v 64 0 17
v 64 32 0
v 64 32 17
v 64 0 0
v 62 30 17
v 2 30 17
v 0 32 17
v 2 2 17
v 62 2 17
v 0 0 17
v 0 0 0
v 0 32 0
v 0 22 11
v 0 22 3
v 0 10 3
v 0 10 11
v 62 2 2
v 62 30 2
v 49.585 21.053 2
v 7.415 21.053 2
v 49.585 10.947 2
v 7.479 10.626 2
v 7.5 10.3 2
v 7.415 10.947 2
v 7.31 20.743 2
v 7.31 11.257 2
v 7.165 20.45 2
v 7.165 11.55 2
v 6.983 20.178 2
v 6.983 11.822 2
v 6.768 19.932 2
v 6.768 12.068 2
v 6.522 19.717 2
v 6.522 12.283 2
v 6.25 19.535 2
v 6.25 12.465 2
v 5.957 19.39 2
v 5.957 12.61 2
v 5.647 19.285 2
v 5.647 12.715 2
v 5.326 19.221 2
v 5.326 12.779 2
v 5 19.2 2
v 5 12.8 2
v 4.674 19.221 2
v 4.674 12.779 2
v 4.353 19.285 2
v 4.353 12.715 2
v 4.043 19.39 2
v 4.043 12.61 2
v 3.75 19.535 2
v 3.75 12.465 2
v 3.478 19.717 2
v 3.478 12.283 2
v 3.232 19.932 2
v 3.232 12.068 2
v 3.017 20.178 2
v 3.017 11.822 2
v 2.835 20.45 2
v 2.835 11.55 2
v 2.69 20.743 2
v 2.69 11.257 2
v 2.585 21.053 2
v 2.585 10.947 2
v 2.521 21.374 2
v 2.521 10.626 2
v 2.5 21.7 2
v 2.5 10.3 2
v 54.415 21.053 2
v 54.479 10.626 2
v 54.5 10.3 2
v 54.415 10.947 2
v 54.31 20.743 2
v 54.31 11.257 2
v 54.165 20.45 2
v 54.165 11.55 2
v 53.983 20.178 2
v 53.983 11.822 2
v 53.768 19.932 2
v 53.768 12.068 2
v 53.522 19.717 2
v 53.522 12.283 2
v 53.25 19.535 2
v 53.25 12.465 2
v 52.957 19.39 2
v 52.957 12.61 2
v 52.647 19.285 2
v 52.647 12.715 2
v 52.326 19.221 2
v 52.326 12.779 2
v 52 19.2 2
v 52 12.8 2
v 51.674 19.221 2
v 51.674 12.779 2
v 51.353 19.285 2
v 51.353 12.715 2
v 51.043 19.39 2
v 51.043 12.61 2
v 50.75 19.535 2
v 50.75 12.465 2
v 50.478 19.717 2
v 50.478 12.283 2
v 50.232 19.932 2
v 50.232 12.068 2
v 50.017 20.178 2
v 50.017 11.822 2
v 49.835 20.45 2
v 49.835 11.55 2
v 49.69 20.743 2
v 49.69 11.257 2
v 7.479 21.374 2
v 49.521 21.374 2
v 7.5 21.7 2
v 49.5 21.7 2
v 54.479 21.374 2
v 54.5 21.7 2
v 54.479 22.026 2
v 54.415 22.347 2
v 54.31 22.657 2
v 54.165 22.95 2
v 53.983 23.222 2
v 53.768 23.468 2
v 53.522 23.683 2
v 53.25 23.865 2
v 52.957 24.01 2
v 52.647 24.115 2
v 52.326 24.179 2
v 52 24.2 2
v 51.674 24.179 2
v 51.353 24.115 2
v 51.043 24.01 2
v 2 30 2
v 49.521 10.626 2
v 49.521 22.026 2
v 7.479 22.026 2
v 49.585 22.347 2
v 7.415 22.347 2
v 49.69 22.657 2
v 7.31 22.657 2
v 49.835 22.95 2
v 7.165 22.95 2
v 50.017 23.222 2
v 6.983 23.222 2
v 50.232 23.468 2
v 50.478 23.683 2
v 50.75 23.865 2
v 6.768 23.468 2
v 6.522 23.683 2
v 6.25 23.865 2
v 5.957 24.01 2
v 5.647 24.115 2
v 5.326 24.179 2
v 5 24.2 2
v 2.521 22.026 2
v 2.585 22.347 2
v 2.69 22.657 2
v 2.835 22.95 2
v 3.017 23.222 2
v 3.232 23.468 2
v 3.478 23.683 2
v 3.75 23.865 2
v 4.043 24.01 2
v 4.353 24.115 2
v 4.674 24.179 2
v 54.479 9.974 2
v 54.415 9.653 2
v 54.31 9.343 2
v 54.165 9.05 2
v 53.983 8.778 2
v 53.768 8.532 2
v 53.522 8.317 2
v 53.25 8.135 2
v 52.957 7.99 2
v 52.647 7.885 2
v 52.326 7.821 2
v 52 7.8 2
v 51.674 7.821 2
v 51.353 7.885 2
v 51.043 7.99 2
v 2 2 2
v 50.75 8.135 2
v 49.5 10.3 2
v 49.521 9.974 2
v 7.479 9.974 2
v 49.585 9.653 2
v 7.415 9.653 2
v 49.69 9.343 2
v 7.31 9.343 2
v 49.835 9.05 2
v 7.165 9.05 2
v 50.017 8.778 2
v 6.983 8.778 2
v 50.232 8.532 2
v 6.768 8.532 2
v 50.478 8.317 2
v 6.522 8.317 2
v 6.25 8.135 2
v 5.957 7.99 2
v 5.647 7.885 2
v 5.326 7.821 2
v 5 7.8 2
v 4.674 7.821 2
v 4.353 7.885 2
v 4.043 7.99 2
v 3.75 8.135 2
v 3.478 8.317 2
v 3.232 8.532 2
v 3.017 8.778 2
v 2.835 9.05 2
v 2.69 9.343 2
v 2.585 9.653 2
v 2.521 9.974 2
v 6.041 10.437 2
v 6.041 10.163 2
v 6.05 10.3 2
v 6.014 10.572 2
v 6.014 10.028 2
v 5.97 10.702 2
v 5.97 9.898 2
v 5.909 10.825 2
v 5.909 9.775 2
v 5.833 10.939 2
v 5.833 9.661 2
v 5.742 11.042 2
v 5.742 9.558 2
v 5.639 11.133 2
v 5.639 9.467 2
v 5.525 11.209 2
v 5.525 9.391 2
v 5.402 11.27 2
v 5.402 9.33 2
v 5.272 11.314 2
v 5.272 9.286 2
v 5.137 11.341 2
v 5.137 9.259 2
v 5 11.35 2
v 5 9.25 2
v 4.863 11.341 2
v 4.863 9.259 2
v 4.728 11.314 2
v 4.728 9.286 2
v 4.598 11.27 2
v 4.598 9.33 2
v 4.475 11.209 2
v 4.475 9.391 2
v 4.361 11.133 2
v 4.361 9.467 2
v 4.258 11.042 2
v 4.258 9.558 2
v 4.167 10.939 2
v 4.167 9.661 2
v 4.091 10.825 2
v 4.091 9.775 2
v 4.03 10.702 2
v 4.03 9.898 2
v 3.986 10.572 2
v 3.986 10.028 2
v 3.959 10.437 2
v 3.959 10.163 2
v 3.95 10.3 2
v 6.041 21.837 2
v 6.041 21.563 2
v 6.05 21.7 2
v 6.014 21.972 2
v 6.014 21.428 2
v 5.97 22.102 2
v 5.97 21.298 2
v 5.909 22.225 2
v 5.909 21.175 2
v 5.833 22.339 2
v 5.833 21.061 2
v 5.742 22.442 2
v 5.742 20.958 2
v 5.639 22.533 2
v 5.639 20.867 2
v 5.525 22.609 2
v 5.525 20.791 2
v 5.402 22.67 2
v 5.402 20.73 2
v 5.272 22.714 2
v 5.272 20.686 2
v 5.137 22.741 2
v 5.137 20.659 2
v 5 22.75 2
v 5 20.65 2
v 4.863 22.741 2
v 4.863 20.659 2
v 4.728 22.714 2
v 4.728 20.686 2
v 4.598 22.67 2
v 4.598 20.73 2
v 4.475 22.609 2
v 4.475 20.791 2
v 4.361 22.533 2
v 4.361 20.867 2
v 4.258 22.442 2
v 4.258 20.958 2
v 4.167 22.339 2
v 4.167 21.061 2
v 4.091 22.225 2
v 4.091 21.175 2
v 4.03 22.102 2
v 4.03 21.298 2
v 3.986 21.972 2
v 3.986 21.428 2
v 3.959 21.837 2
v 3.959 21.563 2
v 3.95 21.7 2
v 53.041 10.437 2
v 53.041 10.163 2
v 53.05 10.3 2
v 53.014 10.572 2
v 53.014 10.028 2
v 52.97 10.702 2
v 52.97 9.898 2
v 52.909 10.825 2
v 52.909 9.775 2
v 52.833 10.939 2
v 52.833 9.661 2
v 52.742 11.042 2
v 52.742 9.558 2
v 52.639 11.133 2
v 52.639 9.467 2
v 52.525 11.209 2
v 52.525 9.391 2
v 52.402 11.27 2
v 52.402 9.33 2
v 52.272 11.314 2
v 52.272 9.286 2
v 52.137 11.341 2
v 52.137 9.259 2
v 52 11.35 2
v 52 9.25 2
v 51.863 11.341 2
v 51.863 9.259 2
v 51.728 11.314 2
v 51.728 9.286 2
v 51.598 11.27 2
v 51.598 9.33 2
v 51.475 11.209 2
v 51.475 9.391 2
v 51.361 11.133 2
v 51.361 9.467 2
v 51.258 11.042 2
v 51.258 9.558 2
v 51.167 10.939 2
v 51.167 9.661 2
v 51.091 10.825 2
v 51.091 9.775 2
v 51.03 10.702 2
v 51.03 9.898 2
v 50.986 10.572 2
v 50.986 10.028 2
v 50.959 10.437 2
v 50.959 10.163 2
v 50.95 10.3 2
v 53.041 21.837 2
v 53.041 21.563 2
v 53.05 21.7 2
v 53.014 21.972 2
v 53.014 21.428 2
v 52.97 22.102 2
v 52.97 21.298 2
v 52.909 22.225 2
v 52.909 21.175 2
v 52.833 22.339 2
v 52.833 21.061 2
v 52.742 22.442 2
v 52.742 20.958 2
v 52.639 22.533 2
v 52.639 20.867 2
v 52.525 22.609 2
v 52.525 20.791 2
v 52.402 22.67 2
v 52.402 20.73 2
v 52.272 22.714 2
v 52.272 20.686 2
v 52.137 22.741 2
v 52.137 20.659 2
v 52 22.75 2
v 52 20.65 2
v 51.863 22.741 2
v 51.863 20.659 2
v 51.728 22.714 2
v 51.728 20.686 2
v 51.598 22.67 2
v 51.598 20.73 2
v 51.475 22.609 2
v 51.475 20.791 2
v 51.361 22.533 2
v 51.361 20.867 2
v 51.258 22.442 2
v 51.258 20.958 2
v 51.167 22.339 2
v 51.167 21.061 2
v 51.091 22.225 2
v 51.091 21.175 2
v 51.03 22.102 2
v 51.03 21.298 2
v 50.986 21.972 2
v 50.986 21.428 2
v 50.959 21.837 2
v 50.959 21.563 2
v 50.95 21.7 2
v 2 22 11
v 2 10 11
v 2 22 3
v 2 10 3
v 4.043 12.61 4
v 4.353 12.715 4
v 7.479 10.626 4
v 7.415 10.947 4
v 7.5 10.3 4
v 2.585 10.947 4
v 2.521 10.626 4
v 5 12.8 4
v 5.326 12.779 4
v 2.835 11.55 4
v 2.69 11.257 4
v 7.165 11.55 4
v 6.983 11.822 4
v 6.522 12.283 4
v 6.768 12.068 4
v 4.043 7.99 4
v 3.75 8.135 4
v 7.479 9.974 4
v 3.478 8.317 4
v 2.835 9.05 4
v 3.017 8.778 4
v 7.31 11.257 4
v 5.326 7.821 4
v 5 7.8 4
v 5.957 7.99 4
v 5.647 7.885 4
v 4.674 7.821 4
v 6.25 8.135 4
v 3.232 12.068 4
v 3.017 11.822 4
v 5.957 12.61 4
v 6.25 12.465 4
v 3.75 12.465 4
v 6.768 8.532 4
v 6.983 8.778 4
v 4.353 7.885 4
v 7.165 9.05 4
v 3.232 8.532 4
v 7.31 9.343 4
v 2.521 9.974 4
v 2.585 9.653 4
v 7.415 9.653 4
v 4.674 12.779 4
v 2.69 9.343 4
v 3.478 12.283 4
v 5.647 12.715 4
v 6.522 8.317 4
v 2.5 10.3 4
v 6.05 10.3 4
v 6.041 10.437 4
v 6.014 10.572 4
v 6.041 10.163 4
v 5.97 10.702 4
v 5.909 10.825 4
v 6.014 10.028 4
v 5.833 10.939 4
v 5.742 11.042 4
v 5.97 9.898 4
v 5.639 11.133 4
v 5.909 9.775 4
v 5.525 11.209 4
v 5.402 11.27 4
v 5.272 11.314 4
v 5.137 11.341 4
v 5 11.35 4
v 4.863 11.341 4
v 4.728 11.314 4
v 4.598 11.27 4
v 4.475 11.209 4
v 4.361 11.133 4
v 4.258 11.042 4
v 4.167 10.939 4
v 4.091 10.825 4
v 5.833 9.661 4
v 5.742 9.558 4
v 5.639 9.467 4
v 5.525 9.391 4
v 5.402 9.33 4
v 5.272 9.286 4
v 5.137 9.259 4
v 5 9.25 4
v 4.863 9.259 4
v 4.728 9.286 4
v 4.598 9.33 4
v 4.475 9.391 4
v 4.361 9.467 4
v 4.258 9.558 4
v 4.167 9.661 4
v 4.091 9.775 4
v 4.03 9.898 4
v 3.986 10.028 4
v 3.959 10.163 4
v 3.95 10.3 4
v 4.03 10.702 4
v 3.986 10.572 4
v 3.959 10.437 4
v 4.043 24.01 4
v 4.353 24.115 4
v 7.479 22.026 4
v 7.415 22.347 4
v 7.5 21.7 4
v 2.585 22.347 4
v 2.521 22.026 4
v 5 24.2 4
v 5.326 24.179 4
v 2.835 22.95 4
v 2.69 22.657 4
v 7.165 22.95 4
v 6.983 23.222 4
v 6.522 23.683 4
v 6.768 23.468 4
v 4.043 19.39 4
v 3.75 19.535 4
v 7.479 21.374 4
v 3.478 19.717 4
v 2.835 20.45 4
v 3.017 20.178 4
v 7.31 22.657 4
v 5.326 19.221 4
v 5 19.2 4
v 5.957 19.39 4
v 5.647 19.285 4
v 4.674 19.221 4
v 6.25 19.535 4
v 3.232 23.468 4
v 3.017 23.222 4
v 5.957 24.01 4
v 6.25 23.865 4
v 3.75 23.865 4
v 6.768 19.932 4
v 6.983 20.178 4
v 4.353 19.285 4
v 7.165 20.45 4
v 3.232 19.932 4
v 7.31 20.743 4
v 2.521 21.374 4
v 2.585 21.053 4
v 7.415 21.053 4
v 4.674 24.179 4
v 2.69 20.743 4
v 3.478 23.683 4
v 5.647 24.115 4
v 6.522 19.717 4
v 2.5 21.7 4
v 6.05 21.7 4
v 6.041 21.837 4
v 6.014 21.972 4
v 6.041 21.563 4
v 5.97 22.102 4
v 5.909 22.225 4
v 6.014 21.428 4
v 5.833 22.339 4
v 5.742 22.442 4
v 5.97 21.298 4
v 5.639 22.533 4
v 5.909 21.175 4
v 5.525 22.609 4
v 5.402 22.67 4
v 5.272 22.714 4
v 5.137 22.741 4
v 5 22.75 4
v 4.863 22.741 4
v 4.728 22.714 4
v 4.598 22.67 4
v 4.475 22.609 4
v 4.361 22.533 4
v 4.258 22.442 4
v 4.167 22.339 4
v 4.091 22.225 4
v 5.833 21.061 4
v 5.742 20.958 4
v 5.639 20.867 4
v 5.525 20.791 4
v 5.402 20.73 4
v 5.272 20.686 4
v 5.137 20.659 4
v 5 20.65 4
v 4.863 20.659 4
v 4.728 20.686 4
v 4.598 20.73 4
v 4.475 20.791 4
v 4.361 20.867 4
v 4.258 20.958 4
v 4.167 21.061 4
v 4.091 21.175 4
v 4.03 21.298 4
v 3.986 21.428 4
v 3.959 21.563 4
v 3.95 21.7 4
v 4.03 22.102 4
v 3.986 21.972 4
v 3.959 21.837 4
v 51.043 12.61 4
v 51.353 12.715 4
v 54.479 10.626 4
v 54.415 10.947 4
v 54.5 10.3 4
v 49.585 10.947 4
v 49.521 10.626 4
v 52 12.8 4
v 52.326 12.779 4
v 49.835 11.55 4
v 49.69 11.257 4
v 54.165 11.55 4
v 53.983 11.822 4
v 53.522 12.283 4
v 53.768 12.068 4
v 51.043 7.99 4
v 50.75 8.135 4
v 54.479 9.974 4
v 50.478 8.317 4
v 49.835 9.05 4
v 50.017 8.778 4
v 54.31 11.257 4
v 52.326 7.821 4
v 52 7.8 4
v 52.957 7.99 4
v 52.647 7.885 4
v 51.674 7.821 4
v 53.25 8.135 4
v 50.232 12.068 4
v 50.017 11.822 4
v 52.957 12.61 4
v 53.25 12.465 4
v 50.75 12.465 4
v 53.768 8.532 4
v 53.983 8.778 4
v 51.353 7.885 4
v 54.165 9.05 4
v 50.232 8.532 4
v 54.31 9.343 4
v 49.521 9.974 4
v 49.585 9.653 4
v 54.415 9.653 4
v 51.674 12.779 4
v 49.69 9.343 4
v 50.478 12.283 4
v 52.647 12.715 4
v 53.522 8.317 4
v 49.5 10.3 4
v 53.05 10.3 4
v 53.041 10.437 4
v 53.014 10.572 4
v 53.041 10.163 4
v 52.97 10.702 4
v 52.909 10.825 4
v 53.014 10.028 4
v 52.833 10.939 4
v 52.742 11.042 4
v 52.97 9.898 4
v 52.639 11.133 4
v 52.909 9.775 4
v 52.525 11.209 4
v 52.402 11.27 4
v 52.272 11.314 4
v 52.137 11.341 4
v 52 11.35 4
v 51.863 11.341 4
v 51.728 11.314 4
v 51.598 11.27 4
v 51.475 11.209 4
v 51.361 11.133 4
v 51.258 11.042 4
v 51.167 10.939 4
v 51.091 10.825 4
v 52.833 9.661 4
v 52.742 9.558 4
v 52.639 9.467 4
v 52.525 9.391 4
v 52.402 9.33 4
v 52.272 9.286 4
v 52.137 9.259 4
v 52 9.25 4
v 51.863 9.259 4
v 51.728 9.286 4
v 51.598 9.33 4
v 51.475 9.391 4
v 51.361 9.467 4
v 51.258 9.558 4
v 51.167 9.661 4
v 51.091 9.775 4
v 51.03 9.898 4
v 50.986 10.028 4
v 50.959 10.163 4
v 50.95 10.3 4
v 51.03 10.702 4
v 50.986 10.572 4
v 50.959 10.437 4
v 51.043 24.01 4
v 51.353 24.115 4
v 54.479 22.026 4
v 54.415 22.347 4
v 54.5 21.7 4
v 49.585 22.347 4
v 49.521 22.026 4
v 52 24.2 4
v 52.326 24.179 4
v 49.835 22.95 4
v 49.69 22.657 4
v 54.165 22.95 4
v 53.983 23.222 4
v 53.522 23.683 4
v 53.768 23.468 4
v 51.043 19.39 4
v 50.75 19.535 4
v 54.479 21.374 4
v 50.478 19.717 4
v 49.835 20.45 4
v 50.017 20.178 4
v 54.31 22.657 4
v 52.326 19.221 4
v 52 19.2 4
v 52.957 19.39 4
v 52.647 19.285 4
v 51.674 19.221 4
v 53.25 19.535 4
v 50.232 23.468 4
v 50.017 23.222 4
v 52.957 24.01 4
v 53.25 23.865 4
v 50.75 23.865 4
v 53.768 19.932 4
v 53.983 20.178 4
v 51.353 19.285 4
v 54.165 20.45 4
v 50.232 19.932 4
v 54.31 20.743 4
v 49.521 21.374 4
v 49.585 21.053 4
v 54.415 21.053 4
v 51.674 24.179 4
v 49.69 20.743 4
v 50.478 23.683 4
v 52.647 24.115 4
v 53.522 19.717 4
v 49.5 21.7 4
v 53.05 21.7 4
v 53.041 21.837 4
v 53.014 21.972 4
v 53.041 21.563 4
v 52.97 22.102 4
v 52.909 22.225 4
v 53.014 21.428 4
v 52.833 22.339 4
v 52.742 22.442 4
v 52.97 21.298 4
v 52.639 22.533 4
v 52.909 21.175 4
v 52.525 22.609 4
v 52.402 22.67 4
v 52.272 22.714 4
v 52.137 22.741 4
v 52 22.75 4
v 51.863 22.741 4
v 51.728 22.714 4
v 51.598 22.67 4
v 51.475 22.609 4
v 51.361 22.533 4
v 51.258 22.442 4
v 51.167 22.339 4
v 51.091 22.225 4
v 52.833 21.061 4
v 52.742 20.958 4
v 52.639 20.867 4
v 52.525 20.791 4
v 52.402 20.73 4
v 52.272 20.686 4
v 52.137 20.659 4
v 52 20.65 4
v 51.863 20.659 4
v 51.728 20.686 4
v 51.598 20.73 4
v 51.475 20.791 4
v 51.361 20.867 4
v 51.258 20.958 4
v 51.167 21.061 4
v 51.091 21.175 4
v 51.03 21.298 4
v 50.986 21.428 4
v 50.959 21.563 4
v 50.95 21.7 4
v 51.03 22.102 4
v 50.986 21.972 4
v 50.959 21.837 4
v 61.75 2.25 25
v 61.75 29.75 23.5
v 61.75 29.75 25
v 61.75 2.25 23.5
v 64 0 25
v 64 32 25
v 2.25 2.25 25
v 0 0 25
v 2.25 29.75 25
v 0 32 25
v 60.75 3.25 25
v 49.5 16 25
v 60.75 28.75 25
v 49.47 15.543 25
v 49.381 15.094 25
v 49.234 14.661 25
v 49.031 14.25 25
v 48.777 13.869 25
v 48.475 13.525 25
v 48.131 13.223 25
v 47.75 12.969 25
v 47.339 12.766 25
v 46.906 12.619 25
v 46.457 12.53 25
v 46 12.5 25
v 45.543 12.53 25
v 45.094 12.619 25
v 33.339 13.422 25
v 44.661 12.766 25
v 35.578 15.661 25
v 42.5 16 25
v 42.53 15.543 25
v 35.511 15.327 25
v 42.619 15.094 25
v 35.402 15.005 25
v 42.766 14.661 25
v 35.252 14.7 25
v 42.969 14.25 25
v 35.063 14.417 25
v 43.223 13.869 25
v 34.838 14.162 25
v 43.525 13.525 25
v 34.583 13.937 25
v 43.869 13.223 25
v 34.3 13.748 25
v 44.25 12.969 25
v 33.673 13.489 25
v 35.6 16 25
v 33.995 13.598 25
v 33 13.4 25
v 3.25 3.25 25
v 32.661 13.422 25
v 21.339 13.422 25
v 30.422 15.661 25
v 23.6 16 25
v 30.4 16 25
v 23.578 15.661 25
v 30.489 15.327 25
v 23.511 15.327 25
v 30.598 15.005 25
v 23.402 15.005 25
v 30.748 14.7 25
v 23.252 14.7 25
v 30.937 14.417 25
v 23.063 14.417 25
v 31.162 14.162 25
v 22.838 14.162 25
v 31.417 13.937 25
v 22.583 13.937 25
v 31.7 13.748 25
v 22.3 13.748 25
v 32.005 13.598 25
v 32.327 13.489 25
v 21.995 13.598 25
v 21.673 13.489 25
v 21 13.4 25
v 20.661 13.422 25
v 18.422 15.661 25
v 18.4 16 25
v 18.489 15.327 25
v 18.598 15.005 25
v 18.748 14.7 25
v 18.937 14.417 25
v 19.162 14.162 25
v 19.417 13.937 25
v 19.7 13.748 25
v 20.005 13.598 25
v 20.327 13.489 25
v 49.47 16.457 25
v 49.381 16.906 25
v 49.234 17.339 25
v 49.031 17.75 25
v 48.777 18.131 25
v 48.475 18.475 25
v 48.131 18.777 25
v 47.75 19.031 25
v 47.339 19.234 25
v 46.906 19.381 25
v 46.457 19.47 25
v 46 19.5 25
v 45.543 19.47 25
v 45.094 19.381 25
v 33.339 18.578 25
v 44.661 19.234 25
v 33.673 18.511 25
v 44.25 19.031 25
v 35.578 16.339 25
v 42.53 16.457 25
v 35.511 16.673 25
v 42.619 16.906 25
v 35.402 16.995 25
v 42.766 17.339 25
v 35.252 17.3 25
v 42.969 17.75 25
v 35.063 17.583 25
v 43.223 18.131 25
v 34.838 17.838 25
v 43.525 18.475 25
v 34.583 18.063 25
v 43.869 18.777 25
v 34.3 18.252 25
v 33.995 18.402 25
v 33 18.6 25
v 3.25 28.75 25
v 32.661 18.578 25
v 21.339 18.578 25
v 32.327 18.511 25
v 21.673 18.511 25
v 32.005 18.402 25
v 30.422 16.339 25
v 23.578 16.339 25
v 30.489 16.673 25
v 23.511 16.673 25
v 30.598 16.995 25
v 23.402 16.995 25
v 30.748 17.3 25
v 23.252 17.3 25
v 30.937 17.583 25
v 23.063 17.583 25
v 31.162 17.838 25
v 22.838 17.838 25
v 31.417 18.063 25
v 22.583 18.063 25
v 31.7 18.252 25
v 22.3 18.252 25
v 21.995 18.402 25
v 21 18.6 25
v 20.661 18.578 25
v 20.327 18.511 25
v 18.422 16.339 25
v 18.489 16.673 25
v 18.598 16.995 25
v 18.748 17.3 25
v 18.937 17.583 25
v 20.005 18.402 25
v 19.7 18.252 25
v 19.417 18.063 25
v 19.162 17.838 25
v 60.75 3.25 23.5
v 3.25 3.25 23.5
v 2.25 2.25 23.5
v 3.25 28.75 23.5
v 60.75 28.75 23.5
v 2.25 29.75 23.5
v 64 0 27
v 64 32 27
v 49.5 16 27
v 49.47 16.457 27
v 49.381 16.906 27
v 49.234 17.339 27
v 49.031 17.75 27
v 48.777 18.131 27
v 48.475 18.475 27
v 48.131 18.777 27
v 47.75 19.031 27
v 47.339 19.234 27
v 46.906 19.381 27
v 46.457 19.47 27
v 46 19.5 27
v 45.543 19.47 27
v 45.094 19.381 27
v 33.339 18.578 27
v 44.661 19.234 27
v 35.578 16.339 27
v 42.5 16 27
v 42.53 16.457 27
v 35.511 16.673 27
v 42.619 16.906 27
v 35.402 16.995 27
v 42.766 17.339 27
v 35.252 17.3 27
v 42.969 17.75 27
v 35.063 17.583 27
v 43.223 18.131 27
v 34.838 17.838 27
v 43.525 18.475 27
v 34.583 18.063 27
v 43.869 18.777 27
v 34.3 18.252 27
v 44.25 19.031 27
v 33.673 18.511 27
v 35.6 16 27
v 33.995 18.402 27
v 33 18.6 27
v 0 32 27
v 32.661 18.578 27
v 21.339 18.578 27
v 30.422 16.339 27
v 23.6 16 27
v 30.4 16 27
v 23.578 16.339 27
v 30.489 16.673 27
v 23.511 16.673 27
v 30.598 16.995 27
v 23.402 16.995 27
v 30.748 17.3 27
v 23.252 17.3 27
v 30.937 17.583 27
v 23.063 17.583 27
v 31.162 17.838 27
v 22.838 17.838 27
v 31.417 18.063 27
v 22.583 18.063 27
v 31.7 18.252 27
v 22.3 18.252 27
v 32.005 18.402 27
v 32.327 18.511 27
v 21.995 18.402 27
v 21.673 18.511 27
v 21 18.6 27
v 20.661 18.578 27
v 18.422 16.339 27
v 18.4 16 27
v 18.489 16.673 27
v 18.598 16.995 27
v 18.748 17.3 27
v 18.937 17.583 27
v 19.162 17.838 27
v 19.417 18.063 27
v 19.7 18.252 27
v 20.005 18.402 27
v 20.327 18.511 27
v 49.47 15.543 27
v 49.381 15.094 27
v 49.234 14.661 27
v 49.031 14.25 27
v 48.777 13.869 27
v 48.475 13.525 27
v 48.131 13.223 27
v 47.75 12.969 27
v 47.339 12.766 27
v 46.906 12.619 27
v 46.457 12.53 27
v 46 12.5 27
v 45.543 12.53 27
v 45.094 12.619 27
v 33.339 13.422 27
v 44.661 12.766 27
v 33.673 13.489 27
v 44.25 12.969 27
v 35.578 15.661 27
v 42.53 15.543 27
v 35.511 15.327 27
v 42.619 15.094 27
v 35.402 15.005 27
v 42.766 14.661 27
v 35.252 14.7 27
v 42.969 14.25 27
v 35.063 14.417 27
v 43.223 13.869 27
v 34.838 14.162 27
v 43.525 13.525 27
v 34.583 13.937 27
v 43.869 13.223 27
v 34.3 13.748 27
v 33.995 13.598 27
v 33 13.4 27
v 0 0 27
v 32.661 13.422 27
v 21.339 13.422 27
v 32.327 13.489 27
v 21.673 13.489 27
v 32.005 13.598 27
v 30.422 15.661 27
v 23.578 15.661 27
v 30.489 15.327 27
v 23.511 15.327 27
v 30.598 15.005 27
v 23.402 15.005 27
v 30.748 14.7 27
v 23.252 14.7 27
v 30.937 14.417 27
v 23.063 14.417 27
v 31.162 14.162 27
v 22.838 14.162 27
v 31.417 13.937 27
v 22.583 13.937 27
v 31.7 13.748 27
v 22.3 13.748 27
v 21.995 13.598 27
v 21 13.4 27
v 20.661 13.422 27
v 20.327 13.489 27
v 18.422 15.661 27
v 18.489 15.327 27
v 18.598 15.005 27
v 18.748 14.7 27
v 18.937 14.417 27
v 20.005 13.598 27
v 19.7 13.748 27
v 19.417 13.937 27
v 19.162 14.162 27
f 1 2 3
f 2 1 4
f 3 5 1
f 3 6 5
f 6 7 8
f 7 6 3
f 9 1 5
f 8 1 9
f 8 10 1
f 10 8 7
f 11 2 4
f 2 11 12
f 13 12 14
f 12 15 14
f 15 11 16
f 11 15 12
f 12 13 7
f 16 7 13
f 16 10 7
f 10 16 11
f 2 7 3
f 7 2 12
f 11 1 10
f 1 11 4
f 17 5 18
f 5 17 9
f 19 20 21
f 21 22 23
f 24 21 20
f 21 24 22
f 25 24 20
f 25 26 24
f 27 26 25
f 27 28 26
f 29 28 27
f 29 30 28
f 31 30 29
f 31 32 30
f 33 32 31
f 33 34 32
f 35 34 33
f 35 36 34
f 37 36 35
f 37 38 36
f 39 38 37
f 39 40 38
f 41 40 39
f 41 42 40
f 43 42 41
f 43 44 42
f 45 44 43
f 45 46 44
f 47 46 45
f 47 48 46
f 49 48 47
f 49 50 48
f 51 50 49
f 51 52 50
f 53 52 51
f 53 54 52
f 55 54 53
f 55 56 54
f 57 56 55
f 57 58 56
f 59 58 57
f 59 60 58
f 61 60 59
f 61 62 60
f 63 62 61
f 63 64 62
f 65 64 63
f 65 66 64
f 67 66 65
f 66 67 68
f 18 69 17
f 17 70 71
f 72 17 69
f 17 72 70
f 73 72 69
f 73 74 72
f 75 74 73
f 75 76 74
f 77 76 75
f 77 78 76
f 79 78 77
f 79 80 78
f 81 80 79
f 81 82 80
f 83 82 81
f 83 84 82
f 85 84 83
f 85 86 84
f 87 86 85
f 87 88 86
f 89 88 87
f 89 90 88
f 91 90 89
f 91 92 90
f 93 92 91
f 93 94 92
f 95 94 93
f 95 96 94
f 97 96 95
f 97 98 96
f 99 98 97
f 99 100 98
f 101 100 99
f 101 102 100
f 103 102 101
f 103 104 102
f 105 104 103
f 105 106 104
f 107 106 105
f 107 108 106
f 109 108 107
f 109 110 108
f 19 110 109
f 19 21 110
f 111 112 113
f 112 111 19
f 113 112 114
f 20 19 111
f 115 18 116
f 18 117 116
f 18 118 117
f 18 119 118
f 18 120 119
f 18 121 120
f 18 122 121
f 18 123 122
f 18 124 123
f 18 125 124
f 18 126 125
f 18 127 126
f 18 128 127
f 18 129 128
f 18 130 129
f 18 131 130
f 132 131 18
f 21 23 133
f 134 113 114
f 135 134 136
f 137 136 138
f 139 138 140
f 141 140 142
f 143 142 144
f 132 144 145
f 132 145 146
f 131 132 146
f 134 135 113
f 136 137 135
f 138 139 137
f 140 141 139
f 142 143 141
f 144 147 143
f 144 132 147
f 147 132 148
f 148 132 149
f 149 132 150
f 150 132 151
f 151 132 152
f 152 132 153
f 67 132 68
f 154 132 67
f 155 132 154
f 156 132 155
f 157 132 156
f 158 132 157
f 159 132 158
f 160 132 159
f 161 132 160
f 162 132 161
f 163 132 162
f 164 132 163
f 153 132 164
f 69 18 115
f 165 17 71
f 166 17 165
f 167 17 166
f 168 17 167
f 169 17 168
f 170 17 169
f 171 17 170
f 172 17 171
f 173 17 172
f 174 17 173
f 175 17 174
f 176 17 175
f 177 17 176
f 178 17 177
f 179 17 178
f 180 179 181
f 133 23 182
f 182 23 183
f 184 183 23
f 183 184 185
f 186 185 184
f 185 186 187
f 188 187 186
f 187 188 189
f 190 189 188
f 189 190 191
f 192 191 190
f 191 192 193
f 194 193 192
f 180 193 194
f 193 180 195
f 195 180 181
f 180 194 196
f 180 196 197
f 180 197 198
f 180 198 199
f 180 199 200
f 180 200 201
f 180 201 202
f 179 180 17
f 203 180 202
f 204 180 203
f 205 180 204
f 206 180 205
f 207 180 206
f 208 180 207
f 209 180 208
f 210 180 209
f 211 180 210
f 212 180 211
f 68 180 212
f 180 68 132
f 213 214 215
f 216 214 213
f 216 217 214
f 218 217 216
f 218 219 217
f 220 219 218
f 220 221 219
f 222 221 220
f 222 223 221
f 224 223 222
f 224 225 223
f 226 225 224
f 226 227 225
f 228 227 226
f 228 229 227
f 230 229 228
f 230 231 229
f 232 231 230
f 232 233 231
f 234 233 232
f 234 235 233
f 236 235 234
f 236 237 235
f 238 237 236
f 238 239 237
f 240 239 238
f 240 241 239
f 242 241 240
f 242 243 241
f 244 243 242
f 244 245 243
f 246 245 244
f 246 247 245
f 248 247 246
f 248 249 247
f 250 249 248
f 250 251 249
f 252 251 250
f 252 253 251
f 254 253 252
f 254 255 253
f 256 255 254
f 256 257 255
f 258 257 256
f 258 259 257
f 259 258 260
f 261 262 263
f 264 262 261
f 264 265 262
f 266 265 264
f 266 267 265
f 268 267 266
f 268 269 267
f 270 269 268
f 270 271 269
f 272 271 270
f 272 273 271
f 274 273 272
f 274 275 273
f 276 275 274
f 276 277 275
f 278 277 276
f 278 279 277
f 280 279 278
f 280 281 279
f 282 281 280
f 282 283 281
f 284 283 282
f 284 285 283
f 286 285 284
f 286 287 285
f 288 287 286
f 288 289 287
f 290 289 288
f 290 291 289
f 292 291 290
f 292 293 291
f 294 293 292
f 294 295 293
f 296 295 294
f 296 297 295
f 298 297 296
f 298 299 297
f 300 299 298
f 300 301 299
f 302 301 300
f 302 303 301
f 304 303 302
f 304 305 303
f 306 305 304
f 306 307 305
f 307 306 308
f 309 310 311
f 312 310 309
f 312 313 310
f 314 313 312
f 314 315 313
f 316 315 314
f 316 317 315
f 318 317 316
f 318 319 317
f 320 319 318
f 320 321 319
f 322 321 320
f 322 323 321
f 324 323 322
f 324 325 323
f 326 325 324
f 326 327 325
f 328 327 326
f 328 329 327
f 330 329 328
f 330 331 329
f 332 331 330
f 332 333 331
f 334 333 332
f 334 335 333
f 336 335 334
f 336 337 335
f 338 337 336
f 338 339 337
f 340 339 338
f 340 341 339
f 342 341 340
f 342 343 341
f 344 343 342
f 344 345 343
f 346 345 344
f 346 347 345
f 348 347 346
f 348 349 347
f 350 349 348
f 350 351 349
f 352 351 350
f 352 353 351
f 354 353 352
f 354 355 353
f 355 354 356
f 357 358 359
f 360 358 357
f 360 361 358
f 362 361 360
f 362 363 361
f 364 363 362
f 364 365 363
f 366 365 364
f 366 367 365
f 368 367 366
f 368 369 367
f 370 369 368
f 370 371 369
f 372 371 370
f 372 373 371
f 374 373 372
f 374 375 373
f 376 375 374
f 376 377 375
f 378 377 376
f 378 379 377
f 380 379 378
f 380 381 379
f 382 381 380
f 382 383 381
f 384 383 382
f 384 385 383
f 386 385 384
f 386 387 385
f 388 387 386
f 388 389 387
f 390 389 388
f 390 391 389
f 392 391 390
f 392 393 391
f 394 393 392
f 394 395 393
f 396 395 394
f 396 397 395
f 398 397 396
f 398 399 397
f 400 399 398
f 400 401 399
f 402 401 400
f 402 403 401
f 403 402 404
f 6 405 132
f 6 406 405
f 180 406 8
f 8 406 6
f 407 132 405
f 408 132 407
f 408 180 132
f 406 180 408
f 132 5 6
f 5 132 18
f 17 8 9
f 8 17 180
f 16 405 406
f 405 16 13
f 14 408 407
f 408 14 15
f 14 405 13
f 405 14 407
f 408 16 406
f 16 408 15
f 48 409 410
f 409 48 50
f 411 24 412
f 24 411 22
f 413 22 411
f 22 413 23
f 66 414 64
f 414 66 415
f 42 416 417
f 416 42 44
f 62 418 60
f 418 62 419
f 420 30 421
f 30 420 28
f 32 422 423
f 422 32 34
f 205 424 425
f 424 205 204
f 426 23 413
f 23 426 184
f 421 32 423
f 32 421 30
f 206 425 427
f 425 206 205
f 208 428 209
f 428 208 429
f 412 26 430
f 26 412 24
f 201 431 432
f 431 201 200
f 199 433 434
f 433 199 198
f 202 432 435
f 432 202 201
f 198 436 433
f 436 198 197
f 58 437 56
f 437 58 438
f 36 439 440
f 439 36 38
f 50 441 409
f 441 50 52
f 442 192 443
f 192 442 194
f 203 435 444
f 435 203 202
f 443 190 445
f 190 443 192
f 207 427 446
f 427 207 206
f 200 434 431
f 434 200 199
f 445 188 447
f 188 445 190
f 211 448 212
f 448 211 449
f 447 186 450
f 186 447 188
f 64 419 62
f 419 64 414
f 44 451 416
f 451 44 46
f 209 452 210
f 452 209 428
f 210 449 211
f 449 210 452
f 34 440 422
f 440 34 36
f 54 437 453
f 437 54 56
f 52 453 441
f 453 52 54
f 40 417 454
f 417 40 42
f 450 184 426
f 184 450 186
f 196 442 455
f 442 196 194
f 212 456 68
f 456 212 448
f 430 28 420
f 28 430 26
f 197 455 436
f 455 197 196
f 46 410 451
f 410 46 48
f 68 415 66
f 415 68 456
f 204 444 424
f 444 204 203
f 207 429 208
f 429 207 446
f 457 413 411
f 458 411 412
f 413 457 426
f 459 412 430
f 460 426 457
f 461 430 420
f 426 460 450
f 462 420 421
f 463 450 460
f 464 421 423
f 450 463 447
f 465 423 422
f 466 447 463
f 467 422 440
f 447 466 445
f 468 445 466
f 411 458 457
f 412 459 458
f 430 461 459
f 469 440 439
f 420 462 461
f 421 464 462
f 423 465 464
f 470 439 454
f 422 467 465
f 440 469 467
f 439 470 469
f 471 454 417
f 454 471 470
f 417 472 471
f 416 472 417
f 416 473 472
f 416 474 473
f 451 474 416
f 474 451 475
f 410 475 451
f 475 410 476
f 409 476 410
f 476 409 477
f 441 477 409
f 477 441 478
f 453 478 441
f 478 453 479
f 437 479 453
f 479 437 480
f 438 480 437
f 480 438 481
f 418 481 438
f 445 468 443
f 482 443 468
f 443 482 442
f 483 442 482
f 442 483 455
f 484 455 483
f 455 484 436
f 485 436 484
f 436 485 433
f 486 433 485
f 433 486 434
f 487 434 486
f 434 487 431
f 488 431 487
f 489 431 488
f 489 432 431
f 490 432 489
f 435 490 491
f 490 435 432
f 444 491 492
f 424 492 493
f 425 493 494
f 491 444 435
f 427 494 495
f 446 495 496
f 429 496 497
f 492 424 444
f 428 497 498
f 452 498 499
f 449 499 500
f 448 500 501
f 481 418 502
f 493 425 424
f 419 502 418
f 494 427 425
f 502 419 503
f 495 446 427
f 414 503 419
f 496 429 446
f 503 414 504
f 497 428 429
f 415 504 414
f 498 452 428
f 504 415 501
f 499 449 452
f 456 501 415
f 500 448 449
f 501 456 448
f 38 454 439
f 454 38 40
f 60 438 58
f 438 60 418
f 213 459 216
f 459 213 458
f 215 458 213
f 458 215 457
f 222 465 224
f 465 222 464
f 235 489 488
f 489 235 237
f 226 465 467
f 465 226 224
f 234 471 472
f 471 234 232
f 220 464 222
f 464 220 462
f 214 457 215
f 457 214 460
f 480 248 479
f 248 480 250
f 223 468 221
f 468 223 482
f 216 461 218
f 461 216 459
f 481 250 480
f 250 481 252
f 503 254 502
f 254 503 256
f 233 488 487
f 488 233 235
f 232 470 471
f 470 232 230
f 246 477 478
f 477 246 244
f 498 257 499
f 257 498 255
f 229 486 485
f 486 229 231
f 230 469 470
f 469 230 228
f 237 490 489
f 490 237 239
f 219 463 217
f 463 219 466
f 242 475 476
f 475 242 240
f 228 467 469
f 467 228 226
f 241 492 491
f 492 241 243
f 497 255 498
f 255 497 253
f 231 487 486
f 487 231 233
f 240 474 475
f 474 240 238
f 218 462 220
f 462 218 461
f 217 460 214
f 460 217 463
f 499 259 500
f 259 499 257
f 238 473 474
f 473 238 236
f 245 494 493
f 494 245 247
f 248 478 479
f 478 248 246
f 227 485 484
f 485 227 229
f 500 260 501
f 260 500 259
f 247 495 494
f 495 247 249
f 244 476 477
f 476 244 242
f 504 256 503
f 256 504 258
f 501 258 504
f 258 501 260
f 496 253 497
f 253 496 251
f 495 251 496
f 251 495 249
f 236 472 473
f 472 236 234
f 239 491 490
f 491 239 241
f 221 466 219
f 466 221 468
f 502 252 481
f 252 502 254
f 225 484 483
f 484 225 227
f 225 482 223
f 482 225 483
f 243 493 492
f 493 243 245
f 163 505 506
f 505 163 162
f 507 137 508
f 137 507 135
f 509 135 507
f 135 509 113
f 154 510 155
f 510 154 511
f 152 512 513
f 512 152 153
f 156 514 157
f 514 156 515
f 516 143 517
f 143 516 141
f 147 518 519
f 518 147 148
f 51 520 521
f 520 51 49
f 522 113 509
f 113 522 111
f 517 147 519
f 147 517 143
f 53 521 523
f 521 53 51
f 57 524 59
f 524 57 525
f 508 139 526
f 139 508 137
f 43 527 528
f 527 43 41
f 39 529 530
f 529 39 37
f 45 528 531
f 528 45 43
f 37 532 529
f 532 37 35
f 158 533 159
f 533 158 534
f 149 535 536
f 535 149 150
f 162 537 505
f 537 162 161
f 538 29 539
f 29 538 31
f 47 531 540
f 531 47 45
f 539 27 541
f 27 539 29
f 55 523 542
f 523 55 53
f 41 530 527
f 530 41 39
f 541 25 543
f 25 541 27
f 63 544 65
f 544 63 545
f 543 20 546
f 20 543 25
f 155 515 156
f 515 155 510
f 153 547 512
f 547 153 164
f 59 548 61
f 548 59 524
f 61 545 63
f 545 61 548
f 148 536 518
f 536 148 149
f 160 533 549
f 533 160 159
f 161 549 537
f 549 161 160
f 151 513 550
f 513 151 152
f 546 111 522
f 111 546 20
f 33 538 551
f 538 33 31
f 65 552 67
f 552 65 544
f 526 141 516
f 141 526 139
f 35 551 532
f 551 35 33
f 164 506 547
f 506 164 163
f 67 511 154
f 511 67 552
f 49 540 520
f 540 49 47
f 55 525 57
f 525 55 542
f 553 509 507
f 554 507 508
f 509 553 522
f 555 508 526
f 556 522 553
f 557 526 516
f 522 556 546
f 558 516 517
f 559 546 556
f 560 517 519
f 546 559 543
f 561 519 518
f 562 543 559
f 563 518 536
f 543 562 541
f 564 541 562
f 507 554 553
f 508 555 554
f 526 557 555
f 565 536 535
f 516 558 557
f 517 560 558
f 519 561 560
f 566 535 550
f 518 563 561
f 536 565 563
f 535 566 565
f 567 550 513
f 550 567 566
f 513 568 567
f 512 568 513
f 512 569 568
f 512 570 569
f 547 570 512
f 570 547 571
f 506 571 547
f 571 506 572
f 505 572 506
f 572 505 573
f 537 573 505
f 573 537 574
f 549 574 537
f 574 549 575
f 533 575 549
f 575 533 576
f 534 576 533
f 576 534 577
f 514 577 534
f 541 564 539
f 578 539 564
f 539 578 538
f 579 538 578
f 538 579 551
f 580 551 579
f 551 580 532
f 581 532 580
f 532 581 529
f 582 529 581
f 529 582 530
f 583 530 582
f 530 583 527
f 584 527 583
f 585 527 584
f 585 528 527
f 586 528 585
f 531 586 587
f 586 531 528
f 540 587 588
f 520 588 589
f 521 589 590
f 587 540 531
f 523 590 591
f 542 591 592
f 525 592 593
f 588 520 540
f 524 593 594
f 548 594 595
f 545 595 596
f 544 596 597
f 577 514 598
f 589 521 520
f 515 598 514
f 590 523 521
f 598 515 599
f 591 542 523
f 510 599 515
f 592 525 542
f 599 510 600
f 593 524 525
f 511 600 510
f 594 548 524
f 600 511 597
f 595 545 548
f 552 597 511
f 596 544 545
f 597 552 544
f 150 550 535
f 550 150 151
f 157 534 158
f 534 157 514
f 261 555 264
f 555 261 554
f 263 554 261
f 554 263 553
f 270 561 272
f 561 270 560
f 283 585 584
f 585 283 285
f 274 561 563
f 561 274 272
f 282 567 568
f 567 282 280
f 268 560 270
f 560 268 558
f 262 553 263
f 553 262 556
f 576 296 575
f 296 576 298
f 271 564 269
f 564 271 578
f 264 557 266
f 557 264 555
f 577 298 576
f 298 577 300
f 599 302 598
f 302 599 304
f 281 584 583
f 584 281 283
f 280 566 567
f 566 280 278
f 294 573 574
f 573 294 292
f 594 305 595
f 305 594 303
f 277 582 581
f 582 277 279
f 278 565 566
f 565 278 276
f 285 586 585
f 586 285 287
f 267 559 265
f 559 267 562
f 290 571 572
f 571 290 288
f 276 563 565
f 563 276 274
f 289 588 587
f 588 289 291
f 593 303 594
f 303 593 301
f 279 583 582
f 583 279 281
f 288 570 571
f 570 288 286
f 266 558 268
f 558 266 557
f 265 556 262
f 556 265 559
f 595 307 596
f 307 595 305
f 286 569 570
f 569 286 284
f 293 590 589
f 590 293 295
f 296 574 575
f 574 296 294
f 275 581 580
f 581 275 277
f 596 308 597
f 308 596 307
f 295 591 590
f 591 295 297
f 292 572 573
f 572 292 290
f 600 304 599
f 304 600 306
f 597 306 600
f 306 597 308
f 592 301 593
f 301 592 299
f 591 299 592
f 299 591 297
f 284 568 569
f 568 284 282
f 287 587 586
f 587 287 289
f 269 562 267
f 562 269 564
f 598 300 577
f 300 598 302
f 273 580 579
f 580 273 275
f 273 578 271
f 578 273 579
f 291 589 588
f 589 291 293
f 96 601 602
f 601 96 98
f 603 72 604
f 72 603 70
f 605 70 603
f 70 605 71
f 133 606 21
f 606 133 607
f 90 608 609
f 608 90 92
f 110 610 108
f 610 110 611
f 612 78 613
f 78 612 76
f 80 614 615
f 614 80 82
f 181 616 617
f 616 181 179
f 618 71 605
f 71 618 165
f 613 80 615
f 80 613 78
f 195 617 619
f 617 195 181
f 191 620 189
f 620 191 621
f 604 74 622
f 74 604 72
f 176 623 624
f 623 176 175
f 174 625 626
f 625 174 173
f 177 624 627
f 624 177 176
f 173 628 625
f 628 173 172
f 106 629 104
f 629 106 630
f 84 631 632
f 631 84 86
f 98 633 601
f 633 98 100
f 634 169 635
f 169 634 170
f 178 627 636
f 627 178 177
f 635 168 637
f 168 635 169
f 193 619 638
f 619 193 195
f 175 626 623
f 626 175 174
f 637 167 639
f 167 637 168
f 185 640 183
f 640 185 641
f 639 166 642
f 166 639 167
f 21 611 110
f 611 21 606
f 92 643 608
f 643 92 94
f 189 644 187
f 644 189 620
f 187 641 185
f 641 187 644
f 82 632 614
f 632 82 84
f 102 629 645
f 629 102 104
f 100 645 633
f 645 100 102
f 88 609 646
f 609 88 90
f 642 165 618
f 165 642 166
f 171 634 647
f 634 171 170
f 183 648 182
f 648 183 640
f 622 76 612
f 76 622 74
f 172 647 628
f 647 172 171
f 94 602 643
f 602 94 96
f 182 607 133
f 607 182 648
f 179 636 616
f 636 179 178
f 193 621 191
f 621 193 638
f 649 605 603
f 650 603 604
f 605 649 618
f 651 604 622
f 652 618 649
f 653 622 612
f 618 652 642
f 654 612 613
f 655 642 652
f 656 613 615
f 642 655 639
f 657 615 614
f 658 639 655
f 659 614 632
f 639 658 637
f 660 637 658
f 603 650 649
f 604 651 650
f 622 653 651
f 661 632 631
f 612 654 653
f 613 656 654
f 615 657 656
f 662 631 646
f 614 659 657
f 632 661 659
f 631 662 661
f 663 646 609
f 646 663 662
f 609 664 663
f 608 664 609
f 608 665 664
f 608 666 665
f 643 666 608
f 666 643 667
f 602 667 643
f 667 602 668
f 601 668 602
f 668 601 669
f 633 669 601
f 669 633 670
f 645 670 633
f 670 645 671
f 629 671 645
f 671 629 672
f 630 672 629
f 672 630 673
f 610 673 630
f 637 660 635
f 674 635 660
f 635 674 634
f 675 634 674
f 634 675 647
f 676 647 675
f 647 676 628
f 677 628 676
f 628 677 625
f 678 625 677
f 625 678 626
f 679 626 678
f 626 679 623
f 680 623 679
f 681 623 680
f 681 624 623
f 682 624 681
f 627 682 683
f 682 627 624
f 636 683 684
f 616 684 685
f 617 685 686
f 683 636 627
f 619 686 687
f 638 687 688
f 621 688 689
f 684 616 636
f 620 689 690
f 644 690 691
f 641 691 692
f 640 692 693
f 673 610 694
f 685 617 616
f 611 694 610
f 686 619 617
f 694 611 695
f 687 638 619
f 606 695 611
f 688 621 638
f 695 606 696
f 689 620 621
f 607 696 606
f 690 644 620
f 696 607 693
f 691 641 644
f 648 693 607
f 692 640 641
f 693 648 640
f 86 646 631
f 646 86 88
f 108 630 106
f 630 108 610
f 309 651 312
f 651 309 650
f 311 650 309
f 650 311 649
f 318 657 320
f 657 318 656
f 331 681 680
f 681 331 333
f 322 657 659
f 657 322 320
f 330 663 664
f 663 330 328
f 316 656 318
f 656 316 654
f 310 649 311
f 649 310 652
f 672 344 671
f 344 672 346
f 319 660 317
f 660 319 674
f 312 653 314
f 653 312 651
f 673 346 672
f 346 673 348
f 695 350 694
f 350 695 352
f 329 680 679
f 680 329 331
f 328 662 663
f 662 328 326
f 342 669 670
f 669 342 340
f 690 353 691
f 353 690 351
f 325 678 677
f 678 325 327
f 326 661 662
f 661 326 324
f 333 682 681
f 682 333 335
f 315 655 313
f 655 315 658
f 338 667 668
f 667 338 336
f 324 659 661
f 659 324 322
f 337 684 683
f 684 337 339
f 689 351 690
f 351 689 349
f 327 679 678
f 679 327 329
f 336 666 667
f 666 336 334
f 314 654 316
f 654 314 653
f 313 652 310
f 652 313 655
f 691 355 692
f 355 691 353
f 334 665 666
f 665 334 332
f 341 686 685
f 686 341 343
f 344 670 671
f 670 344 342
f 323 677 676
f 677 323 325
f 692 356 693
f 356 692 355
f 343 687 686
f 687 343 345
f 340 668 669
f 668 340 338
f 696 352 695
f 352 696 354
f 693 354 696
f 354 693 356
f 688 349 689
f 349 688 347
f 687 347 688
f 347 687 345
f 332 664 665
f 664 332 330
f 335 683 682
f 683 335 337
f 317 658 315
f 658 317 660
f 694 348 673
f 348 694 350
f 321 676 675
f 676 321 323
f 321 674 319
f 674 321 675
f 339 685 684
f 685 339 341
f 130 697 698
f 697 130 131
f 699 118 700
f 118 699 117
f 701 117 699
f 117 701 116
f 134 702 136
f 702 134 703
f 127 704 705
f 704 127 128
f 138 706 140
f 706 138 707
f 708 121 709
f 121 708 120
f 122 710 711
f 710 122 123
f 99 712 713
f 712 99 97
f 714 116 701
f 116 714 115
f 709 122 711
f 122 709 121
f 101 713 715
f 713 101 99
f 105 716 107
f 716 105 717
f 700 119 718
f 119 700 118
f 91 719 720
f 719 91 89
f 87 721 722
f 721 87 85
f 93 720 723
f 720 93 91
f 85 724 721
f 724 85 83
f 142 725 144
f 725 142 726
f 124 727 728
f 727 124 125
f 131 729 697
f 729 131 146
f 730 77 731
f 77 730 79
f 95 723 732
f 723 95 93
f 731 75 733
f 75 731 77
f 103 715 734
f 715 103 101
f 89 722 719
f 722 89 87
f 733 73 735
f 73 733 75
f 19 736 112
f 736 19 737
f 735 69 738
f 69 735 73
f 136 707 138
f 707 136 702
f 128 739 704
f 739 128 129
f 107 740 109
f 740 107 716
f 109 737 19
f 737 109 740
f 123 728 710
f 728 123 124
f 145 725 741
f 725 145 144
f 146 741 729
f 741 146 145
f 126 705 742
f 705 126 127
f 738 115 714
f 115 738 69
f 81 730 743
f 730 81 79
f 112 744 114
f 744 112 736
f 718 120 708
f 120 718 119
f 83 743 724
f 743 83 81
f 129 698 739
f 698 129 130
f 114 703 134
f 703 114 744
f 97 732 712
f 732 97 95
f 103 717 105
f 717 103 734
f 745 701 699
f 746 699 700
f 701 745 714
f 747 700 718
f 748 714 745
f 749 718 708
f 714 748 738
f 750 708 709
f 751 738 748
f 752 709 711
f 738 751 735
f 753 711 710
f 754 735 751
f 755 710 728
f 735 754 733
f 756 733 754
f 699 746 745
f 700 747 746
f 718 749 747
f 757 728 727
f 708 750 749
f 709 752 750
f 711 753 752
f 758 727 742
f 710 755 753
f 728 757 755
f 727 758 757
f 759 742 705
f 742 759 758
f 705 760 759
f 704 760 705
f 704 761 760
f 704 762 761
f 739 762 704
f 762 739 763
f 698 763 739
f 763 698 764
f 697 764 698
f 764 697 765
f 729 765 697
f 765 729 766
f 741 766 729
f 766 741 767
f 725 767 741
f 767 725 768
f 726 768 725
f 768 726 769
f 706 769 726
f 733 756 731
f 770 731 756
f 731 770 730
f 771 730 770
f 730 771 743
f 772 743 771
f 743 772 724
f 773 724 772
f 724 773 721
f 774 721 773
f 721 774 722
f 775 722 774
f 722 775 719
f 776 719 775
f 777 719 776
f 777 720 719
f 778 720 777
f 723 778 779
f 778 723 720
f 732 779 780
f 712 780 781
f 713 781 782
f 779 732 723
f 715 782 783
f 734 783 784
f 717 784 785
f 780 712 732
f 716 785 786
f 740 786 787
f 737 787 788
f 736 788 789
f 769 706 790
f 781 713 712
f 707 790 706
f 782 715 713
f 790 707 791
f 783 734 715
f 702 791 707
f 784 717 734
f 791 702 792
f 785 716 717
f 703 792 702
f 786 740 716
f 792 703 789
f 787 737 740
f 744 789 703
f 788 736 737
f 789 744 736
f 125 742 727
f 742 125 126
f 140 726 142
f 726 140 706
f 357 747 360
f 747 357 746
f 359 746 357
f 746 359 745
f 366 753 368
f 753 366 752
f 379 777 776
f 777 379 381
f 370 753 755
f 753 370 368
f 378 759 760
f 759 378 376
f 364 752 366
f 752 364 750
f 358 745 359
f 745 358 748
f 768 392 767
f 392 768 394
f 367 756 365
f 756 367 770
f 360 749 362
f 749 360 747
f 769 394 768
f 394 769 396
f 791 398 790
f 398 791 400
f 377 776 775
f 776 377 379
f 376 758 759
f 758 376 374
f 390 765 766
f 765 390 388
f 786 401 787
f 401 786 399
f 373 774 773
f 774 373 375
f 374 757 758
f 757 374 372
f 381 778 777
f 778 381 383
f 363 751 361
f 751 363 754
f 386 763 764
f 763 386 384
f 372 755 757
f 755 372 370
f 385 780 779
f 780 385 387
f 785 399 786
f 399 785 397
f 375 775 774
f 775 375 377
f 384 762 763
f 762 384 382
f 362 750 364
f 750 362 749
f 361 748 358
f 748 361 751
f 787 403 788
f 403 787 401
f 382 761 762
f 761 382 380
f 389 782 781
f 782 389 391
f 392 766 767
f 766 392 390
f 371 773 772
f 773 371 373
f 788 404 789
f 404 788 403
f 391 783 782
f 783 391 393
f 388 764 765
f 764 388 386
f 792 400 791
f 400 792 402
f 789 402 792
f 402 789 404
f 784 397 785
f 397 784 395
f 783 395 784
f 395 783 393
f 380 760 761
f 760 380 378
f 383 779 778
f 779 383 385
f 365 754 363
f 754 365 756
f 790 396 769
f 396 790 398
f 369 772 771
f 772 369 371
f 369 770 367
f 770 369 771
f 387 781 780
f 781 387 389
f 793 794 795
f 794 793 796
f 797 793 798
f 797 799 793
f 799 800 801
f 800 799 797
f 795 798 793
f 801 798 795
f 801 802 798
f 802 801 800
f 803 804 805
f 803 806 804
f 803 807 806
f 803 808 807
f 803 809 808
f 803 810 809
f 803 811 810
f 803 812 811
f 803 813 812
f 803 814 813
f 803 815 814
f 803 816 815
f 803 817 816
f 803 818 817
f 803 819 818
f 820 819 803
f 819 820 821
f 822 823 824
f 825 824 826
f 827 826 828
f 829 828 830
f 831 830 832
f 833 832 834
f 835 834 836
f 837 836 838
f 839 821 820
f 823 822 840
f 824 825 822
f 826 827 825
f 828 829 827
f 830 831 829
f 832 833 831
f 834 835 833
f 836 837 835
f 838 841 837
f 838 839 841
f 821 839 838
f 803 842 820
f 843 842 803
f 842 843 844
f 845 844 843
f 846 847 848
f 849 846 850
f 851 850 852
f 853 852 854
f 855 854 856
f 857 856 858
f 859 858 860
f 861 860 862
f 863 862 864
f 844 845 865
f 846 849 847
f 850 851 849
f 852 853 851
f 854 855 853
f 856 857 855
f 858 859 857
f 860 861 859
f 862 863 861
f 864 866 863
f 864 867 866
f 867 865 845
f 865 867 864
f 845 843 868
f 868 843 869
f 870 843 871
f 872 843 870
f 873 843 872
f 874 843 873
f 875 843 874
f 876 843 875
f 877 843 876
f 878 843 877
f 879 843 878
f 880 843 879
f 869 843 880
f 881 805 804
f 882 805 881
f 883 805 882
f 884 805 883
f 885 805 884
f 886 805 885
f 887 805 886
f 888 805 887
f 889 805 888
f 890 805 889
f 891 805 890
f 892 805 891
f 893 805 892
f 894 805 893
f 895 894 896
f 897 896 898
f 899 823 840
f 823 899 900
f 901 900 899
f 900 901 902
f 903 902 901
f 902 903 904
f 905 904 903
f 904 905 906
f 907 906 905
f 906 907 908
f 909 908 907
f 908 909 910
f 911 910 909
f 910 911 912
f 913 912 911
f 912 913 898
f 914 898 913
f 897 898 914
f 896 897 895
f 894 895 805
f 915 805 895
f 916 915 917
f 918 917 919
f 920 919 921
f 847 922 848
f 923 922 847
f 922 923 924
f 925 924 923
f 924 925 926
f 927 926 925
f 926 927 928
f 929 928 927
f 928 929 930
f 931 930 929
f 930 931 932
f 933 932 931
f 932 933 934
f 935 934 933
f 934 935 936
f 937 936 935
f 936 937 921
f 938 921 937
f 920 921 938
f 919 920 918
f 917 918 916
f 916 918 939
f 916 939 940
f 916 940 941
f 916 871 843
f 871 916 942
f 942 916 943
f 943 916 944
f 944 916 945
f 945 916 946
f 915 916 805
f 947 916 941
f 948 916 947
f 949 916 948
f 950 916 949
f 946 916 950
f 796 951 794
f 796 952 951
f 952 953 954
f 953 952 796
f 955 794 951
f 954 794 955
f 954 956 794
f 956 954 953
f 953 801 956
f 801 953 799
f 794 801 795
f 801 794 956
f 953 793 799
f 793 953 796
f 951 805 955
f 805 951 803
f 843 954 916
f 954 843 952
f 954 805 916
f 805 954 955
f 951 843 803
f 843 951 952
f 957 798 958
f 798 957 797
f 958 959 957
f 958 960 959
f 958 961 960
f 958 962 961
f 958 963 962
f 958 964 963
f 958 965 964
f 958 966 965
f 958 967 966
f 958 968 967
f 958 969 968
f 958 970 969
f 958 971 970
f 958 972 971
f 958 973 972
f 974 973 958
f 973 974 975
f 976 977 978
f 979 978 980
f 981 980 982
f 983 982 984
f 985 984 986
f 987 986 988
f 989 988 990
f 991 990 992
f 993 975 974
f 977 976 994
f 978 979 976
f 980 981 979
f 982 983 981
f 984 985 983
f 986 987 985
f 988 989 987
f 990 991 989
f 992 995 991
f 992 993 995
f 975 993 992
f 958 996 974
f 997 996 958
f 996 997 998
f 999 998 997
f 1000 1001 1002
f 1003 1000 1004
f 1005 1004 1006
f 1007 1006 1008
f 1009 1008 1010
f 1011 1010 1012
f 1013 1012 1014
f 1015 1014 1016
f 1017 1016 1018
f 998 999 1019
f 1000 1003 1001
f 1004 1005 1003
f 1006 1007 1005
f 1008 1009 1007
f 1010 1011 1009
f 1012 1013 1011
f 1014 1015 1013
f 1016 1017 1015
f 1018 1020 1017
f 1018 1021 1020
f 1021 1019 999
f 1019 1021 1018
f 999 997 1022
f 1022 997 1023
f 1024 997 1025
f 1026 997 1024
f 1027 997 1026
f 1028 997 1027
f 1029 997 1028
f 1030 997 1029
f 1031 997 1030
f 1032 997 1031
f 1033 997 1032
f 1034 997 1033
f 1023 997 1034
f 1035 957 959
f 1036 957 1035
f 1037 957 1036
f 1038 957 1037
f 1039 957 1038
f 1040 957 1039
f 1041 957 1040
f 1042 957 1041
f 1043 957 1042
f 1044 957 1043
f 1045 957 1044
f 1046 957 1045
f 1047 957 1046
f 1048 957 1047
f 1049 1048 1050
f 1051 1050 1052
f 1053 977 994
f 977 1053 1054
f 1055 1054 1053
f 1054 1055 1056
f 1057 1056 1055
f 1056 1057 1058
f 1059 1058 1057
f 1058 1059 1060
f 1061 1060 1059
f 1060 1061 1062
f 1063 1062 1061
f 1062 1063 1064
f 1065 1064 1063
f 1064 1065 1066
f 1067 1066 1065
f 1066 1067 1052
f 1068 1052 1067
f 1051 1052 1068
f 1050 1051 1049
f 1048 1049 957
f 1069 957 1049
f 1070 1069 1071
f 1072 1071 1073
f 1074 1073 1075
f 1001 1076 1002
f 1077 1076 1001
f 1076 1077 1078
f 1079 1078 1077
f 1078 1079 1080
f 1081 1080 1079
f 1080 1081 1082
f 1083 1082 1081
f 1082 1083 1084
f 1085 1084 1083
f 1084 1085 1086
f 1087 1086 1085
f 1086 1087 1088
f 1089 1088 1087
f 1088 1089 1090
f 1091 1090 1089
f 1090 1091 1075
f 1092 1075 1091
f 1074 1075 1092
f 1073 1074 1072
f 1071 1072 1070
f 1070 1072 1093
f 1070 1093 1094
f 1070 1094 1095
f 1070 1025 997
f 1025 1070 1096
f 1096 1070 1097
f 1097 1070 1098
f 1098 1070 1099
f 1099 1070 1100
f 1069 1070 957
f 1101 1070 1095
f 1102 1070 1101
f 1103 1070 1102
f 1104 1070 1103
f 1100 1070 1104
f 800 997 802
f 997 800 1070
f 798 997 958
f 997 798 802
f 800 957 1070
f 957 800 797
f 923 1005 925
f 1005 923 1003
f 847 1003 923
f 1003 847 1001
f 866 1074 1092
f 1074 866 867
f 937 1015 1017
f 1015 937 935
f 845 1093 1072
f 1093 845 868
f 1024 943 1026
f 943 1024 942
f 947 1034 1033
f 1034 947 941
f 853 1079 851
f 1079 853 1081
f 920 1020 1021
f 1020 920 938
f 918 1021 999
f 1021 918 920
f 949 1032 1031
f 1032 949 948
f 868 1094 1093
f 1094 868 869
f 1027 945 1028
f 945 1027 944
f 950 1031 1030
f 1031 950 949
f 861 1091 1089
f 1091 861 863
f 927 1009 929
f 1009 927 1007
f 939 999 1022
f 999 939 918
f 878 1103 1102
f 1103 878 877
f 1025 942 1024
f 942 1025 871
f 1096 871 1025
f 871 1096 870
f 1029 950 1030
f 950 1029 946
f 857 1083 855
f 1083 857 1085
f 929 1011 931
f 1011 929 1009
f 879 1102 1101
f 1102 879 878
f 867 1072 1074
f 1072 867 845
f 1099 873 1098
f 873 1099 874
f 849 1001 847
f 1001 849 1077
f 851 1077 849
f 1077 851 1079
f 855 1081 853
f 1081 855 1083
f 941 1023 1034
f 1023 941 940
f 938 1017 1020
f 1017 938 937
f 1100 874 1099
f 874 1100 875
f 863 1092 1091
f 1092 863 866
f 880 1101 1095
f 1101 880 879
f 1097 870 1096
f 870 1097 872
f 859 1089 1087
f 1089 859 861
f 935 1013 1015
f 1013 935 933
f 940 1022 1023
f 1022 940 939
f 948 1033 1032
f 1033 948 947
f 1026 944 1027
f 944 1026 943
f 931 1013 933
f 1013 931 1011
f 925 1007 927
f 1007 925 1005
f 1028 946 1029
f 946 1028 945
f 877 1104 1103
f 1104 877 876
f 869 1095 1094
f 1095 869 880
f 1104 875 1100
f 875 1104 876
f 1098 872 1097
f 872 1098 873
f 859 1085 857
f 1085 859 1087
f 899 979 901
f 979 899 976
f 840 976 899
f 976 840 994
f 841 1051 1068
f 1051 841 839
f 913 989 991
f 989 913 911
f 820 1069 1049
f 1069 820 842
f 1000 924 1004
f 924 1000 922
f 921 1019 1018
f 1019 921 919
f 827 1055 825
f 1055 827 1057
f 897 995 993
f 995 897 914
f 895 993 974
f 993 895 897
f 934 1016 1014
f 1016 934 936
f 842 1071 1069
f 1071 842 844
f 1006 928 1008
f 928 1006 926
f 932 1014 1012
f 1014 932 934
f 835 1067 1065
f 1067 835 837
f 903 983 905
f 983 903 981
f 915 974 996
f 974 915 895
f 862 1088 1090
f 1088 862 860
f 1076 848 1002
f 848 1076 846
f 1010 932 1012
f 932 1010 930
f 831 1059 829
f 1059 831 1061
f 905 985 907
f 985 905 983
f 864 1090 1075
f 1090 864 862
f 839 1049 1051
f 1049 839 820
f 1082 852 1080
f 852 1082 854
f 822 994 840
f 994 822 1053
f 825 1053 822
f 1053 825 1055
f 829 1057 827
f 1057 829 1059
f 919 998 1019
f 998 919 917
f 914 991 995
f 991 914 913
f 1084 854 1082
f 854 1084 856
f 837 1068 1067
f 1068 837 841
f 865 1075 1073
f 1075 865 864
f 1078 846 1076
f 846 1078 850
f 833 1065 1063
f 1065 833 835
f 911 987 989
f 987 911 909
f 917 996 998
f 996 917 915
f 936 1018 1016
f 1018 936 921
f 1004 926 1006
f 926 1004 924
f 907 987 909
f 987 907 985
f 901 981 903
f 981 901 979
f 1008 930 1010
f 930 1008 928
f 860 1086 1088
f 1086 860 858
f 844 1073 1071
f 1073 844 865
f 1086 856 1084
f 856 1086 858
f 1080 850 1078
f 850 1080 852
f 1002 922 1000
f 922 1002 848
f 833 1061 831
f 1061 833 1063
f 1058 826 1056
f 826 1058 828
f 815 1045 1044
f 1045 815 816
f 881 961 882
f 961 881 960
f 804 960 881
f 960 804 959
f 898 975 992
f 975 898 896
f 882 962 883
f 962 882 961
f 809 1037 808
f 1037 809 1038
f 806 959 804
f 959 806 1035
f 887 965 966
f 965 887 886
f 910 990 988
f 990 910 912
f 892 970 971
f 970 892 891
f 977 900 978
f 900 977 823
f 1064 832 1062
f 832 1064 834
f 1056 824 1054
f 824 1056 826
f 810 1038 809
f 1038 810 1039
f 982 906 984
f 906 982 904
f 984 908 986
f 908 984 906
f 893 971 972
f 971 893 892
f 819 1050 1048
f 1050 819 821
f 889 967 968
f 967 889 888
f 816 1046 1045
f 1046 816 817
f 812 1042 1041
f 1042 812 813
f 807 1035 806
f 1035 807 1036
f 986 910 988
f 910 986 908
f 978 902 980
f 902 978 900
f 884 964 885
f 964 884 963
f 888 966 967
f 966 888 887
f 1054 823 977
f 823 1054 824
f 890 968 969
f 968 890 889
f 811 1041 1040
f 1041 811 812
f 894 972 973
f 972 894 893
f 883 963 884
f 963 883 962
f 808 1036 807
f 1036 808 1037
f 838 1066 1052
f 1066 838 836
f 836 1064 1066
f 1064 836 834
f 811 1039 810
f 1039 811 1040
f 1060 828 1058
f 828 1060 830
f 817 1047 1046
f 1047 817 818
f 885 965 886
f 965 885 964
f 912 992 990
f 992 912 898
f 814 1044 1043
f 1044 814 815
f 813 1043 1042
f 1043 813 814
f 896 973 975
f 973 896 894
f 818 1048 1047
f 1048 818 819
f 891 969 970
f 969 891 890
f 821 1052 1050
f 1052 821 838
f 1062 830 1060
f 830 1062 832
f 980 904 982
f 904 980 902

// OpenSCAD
// Pico desk indicator · revision A · millimetres · UNVERIFIED fit study.
// Measure board, USB lead, LEDs and actual switch before producing.
// Export two STLs: set part="base" or "lid", then Render and Export STL.
part="assembly"; $fn=48;
w=64; d=32; h=17; wall=2; floor=2; lidT=2;
module base(){difference(){cube([w,d,h]);translate([wall,wall,floor])cube([w-2*wall,d-2*wall,h]);translate([-1,d/2-6,3])cube([wall+2,12,8]);} for(x=[5,52])for(y=[d/2-5.7,d/2+5.7])translate([x,y,floor])difference(){cylinder(h=2,r=2.5);translate([0,0,-0.1])cylinder(h=2.2,r=1.05);}}
module lid(){difference(){union(){cube([w,d,lidT]);translate([wall+0.25,wall+0.25,-1.5])difference(){cube([w-2*wall-0.5,d-2*wall-0.5,1.5]);translate([1,1,-0.1])cube([w-2*wall-2.5,d-2*wall-2.5,1.7]);}}for(p=[[21,16,2.6],[33,16,2.6],[46,16,3.5]])translate([p[0],p[1],-2])cylinder(h=6,r=p[2]);}}
if(part=="base")base();else if(part=="lid")translate([0,d,lidT])rotate([180,0,0])lid();else{base();translate([0,0,h+8])lid();}
